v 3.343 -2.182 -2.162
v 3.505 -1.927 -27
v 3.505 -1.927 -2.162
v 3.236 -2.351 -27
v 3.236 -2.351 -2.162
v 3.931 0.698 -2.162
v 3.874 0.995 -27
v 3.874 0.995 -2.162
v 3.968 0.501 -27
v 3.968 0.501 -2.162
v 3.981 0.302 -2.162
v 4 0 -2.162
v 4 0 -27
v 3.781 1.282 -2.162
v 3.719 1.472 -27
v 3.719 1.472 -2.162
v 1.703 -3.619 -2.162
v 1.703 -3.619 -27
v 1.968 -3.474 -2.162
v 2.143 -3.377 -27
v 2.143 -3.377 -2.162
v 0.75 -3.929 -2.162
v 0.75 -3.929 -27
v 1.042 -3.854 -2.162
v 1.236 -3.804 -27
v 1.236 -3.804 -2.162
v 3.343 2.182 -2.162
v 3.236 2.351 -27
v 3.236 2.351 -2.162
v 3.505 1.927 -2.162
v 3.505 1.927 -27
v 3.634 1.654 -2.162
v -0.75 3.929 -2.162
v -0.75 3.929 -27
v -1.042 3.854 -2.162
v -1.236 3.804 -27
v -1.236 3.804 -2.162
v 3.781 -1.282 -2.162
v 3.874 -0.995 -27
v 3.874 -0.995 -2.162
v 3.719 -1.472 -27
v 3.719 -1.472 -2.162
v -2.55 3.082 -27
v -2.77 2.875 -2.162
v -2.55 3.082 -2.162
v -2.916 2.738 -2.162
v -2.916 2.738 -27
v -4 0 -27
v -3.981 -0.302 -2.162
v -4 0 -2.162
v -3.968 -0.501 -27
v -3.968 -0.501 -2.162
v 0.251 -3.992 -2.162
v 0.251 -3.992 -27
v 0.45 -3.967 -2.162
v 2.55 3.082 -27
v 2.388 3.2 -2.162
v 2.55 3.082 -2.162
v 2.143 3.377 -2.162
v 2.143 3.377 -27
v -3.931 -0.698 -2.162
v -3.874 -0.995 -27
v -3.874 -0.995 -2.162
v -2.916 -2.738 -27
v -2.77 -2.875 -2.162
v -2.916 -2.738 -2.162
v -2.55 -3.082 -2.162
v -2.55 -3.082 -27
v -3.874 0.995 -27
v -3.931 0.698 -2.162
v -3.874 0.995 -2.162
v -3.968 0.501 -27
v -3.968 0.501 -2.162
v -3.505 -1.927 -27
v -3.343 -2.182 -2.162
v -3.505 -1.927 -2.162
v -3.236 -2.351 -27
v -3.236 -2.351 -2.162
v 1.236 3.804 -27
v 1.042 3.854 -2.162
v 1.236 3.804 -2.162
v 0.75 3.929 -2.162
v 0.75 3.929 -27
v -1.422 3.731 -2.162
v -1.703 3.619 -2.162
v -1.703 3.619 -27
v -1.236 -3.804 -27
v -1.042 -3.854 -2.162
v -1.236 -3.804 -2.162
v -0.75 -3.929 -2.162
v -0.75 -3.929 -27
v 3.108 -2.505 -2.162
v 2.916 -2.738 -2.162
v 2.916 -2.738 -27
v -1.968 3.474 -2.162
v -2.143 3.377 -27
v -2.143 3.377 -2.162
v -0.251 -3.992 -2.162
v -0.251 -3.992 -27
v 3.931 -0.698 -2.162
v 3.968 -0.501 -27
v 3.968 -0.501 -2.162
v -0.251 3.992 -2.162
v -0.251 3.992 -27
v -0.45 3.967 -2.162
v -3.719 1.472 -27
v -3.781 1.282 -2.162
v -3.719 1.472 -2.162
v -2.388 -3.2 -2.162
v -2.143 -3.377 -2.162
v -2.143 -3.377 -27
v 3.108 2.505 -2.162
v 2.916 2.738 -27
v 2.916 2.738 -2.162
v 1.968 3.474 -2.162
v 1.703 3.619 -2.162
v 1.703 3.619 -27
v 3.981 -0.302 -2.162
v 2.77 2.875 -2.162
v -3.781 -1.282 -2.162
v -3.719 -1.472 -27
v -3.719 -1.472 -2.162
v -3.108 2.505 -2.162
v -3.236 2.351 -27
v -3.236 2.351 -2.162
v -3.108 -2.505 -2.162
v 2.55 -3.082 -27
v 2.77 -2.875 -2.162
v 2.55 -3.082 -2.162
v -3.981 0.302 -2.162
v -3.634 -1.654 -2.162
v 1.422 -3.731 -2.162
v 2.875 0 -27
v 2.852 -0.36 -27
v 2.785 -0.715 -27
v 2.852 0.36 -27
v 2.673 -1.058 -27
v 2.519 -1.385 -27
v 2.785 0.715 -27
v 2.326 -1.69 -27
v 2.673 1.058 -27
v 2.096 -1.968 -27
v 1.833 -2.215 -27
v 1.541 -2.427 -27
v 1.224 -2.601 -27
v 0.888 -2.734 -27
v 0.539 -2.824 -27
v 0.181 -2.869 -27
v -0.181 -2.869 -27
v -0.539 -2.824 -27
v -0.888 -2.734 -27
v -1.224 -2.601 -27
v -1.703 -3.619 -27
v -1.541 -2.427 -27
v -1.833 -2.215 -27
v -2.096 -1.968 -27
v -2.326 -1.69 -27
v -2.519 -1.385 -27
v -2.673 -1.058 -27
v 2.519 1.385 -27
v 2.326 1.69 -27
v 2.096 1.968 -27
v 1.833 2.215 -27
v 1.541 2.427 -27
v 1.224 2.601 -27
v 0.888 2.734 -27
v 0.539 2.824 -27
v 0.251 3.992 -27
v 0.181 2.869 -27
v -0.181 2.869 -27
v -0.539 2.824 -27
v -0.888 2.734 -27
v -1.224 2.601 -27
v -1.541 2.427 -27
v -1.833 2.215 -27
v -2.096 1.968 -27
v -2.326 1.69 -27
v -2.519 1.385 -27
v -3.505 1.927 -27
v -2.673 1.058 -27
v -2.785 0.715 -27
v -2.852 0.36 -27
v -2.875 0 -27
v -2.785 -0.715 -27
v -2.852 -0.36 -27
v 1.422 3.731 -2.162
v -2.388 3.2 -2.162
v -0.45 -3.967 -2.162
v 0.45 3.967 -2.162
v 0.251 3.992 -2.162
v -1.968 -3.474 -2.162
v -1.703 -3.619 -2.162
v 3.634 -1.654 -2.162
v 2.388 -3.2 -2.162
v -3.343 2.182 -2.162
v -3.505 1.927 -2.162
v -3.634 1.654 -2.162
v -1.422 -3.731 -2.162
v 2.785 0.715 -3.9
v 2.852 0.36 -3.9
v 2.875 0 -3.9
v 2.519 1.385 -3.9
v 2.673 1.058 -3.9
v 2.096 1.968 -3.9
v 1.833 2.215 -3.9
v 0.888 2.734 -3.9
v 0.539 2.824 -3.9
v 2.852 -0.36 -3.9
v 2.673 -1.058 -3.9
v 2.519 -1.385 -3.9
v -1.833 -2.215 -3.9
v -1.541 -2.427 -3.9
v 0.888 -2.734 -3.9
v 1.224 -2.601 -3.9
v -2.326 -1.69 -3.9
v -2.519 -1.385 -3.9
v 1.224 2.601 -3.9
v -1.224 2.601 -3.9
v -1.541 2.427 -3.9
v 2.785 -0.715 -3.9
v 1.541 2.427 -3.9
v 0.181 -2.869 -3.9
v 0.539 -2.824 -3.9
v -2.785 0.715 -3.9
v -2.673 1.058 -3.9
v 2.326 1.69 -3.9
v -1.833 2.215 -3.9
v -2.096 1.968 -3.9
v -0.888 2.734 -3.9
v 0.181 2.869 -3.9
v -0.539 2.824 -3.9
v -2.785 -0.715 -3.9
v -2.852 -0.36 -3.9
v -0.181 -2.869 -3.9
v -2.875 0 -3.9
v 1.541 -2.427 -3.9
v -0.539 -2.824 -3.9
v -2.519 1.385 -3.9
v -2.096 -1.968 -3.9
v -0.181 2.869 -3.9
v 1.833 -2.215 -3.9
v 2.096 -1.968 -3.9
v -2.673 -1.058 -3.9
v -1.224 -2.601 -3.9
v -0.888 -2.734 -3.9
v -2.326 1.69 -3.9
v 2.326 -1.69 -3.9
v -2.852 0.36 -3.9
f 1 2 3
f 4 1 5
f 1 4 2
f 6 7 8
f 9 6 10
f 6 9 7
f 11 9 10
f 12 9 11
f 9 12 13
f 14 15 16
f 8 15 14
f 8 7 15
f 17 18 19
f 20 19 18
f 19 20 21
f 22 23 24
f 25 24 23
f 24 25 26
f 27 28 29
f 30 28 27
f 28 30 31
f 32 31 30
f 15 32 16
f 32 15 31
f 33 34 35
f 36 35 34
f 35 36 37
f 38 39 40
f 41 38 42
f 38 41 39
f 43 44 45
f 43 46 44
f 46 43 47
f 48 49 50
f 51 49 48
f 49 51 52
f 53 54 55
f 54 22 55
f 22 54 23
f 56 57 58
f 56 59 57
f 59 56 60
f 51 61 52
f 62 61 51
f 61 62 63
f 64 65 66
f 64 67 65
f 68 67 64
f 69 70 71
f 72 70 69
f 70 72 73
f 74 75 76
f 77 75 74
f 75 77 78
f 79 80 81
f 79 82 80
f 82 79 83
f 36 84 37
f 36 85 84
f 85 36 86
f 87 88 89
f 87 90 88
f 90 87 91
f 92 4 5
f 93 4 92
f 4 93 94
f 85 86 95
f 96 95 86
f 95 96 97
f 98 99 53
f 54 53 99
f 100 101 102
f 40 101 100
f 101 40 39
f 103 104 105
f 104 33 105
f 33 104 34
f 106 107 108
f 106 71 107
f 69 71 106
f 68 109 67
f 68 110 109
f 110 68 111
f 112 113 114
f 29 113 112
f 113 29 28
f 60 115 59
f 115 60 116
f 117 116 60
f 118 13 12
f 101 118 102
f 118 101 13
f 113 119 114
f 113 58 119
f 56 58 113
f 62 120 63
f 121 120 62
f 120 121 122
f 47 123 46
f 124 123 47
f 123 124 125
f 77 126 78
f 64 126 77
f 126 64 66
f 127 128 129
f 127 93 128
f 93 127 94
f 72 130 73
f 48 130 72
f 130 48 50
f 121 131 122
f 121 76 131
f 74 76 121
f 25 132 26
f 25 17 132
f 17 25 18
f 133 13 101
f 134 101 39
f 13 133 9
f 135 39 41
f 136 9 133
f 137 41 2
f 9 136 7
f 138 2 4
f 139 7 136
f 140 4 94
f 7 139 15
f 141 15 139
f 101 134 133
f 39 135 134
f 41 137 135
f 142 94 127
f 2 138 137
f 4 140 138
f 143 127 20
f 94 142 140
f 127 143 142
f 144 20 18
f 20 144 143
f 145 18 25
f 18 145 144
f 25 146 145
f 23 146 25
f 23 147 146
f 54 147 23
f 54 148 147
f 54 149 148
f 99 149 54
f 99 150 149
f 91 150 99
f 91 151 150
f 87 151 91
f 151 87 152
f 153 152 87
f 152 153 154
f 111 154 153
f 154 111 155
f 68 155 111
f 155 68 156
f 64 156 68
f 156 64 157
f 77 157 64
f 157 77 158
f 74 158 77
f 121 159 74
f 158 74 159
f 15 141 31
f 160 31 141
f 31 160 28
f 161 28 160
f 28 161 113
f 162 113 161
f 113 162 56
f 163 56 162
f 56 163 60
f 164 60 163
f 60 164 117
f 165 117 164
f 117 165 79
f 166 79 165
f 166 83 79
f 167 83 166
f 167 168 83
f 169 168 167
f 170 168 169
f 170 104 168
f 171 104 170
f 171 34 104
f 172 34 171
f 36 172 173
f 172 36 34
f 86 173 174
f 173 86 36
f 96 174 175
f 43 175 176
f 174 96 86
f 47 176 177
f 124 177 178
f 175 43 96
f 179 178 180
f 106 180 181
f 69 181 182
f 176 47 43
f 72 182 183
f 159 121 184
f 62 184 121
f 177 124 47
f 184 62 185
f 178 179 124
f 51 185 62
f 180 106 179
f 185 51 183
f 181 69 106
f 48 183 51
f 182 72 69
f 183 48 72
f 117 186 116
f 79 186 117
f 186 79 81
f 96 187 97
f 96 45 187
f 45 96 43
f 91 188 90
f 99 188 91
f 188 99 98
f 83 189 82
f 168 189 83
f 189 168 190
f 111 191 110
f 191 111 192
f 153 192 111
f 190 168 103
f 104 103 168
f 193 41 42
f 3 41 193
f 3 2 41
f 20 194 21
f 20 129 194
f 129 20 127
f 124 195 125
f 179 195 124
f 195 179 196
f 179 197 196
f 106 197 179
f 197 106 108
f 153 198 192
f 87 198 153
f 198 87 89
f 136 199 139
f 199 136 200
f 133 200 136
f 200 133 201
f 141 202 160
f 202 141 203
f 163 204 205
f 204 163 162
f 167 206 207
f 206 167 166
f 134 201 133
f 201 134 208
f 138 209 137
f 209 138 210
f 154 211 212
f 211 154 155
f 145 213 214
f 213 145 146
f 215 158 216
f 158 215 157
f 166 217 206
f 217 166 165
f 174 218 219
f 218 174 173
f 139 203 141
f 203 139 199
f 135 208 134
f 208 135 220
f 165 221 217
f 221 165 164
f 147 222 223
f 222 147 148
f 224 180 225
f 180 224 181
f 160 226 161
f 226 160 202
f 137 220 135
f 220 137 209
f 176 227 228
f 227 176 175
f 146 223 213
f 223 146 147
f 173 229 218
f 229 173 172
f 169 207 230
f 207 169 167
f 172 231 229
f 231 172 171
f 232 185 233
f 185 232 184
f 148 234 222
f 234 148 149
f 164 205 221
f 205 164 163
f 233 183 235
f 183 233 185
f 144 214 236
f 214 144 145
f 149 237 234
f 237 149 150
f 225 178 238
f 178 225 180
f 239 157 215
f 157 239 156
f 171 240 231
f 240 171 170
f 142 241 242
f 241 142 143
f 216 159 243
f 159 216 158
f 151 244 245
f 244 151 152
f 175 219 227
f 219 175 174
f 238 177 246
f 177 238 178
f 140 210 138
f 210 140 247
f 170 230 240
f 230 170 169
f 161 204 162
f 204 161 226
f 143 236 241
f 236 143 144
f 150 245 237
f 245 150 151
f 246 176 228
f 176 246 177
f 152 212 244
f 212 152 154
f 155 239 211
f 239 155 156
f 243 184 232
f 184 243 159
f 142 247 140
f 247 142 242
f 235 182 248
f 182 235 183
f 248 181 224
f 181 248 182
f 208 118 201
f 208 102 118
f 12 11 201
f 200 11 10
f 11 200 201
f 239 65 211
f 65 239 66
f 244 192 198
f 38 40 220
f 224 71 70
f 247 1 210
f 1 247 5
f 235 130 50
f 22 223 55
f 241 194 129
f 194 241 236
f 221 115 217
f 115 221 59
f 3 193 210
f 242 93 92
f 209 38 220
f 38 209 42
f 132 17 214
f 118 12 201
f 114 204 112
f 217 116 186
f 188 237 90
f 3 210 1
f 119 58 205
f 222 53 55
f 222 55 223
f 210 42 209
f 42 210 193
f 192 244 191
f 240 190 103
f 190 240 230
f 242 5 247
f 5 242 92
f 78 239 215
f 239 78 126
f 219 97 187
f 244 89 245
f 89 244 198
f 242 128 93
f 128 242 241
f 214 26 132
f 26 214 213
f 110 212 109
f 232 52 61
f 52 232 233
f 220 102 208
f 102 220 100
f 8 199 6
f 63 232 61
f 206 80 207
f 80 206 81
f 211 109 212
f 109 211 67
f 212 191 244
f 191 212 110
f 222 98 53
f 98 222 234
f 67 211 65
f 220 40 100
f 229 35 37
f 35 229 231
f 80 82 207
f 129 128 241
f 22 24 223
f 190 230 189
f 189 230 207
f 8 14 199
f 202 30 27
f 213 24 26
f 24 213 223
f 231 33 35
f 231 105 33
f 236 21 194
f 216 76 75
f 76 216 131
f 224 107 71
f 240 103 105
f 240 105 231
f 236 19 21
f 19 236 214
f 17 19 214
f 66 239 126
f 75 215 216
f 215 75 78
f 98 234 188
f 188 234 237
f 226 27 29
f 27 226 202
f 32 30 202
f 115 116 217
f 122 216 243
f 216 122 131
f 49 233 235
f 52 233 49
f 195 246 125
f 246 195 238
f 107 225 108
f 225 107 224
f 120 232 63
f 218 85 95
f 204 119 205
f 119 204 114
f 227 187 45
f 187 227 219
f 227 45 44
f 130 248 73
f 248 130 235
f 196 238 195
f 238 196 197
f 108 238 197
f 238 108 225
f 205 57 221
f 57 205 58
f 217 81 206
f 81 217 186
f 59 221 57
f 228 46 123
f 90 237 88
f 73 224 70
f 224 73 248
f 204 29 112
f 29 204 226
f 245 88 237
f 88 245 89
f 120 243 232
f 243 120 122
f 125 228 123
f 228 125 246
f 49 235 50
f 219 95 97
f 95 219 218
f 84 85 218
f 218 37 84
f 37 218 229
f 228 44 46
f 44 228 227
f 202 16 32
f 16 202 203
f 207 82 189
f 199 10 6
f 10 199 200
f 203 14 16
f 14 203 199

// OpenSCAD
$fn = 50;

difference() {
	union() {
		translate(v = [0, 0, -27.0]) {
			cylinder(h = 30, r = 4.0);
		}
		#translate(v = [0, 0, -30.0]) {
			cylinder(h = 30, r = 2.875);
		}
	}
	union() {
		translate(v = [0, 0, 0]) {
			rotate(a = [0, 0, 0]) {
				difference() {
					union() {
						translate(v = [0, 0, -30.0]) {
							cylinder(h = 30, r = 2.6);
						}
						translate(v = [0, 0, -3.9]) {
							cylinder(h = 3.9, r1 = 2.875, r2 = 5.4);
						}
						translate(v = [0, 0, -30.0]) {
							cylinder(h = 30, r = 2.875);
						}
						translate(v = [0, 0, -30.0]) {
							cylinder(h = 30, r = 2.6);
						}
					}
					union();
				}
			}
		}
		#cylinder(h = 3, r = 5.0);
	}
}
